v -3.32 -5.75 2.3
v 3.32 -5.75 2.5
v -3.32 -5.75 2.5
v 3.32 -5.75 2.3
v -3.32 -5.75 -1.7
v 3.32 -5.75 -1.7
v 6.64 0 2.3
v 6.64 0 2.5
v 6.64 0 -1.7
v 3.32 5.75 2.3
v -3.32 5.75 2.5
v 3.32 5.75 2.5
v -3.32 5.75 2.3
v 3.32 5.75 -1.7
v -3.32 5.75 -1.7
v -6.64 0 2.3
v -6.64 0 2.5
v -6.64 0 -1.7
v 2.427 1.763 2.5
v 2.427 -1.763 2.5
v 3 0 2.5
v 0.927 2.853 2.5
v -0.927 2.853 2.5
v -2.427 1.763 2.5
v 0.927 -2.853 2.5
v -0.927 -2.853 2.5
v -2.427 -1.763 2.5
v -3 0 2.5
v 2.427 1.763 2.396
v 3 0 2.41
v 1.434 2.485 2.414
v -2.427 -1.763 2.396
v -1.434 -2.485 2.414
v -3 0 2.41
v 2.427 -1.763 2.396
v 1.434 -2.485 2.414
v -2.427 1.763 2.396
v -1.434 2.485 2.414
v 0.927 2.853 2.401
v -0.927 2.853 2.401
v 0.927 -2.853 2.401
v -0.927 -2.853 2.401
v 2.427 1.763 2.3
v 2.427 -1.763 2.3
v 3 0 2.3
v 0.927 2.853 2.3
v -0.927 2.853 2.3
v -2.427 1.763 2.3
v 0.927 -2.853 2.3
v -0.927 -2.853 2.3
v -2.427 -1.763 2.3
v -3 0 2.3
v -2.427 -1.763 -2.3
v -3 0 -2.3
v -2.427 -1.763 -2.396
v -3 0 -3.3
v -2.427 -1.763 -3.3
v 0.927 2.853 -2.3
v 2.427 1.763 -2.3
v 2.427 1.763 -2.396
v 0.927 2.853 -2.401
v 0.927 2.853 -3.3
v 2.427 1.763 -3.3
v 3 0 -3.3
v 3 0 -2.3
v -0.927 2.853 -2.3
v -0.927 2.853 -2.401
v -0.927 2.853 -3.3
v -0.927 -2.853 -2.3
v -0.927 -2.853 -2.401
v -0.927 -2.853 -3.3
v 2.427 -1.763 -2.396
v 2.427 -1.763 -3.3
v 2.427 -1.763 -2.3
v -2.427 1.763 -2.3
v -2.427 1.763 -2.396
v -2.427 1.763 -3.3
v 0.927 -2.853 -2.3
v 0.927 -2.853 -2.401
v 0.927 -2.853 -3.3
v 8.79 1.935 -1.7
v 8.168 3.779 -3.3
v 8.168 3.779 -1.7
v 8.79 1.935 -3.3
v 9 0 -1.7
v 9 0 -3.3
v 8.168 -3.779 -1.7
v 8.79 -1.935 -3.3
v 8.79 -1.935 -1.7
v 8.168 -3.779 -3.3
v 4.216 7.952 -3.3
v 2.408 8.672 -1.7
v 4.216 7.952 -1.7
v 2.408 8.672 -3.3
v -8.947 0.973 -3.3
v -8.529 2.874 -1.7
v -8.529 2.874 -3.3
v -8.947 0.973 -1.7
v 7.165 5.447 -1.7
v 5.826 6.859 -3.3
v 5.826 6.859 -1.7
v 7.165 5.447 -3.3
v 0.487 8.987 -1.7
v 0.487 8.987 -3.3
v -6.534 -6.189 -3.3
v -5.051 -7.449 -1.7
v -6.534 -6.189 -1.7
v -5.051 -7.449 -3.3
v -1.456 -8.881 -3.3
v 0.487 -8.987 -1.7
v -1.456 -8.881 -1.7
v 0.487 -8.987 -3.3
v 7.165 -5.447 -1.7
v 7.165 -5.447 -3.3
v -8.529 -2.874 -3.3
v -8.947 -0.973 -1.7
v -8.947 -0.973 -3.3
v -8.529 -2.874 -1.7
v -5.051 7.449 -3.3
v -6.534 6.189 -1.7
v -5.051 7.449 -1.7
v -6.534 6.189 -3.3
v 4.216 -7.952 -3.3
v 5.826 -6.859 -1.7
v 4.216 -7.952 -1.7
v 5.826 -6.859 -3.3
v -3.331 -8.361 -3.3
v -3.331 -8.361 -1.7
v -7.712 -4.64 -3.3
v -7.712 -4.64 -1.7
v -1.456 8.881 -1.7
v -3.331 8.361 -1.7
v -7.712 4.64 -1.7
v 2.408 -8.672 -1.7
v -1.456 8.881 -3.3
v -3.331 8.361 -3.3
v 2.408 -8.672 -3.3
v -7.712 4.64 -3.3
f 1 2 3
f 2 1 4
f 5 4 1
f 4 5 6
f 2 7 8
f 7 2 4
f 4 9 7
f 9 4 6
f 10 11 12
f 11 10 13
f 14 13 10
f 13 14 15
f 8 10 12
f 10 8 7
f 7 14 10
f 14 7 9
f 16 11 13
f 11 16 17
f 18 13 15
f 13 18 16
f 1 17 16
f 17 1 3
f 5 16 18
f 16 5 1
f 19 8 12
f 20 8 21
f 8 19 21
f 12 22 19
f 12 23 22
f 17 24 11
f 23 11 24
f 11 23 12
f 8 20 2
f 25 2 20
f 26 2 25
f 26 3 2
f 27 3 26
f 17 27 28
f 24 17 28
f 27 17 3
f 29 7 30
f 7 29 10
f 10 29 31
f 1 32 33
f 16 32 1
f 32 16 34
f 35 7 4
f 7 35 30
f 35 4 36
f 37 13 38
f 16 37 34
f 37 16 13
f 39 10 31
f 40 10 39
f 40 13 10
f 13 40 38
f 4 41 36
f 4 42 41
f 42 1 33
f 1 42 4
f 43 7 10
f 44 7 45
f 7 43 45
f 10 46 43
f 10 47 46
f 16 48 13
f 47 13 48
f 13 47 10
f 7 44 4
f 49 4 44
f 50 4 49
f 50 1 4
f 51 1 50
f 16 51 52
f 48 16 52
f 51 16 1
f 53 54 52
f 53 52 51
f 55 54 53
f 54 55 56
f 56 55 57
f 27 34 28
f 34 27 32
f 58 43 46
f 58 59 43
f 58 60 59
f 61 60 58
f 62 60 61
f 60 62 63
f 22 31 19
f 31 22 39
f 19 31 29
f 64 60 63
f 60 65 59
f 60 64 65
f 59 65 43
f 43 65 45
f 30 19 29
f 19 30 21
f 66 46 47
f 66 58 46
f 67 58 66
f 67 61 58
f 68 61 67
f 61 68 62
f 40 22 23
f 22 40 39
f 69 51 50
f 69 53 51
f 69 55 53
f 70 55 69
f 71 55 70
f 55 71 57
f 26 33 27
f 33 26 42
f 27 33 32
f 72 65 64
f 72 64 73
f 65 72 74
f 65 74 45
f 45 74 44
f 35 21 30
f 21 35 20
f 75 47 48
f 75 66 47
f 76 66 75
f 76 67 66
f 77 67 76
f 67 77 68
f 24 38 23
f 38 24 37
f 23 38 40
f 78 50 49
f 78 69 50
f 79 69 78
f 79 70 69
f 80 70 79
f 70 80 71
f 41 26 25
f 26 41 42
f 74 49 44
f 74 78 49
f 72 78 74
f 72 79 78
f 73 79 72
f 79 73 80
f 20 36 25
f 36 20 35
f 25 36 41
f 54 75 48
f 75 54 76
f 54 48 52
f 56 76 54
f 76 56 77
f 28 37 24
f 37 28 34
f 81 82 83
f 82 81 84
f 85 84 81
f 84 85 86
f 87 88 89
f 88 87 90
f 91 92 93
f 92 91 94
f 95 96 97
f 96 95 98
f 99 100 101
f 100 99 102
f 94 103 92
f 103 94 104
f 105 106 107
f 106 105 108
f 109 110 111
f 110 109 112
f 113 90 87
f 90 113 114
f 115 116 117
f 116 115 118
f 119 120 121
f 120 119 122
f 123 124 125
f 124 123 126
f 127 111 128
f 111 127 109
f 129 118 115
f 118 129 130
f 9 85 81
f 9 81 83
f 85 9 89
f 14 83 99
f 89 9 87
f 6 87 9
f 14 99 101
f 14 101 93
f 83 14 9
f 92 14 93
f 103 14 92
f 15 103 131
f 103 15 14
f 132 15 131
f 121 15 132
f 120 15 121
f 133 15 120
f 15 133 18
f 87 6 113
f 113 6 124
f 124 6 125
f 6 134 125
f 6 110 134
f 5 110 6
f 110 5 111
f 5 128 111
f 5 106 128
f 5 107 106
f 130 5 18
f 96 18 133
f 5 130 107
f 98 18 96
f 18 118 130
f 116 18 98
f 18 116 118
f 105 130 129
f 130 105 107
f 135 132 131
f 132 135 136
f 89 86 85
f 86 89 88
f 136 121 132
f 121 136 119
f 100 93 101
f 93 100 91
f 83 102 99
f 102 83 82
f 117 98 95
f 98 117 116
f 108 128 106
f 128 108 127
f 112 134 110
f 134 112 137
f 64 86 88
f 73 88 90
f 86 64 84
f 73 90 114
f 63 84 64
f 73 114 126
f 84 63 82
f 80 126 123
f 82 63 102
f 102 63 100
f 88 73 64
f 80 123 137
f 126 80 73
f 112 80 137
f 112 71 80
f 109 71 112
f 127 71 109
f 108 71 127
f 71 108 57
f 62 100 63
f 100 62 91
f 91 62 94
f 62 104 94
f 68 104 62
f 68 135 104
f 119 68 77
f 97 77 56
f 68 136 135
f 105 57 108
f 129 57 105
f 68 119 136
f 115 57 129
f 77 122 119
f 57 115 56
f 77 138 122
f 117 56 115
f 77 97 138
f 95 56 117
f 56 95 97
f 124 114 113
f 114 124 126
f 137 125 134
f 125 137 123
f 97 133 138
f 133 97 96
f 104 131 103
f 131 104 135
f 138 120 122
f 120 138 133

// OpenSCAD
// Parameters
thread_nominal_diameter = 6; //[3:12:0.1]
across_flats = 11.5; //[6:23:0.1]
thickness = 5; //[2.5:10:0.1]
hole_diameter = 6; //[3:12:0.1]
include_threads = 0; //[0:1:1]
edge_chamfer = 0.2; //[0:1:0.05]
tolerance_clearance = 0; //[0:0.5:0.05]
overlap = 0.8; //[0.5:2:0.1]
washer_outer_diameter = 18; //[12:36:0.1]
washer_thickness = 1.6; //[0.8:3.2:0.1]

// Nut and Washer - complete geometry
module nut_and_washer() {
  color("DimGray") {
    // Nut with chamfer
    difference() {
      // Hex prism body
      cylinder(h=thickness, r=across_flats/(2*cos(30)), center=true, $fn=6);
      // Chamfer top cone
      translate([0, 0, thickness/2 - edge_chamfer/2])
        cylinder(h=edge_chamfer, r1=across_flats/(2*cos(30)), r2=0, center=true, $fn=6);
      // Chamfer bottom cone
      translate([0, 0, -thickness/2 + edge_chamfer/2])
        rotate([180, 0, 0])
        cylinder(h=edge_chamfer, r1=across_flats/(2*cos(30)), r2=0, center=true, $fn=6);
      // Central through hole
      cylinder(h=thickness + 2*overlap, r=(hole_diameter + tolerance_clearance)/2, center=true);
    }
    
    // Washer
    translate([0, 0, -thickness/2 - washer_thickness/2 + overlap]) {
      difference() {
        // Washer outer
        cylinder(h=washer_thickness, r=washer_outer_diameter/2, center=true);
        // Washer hole
        cylinder(h=washer_thickness + 2*overlap, r=(hole_diameter + tolerance_clearance)/2, center=true);
      }
    }
  }
}

// Assembly
module assembly() {
  nut_and_washer();
}

assembly();
